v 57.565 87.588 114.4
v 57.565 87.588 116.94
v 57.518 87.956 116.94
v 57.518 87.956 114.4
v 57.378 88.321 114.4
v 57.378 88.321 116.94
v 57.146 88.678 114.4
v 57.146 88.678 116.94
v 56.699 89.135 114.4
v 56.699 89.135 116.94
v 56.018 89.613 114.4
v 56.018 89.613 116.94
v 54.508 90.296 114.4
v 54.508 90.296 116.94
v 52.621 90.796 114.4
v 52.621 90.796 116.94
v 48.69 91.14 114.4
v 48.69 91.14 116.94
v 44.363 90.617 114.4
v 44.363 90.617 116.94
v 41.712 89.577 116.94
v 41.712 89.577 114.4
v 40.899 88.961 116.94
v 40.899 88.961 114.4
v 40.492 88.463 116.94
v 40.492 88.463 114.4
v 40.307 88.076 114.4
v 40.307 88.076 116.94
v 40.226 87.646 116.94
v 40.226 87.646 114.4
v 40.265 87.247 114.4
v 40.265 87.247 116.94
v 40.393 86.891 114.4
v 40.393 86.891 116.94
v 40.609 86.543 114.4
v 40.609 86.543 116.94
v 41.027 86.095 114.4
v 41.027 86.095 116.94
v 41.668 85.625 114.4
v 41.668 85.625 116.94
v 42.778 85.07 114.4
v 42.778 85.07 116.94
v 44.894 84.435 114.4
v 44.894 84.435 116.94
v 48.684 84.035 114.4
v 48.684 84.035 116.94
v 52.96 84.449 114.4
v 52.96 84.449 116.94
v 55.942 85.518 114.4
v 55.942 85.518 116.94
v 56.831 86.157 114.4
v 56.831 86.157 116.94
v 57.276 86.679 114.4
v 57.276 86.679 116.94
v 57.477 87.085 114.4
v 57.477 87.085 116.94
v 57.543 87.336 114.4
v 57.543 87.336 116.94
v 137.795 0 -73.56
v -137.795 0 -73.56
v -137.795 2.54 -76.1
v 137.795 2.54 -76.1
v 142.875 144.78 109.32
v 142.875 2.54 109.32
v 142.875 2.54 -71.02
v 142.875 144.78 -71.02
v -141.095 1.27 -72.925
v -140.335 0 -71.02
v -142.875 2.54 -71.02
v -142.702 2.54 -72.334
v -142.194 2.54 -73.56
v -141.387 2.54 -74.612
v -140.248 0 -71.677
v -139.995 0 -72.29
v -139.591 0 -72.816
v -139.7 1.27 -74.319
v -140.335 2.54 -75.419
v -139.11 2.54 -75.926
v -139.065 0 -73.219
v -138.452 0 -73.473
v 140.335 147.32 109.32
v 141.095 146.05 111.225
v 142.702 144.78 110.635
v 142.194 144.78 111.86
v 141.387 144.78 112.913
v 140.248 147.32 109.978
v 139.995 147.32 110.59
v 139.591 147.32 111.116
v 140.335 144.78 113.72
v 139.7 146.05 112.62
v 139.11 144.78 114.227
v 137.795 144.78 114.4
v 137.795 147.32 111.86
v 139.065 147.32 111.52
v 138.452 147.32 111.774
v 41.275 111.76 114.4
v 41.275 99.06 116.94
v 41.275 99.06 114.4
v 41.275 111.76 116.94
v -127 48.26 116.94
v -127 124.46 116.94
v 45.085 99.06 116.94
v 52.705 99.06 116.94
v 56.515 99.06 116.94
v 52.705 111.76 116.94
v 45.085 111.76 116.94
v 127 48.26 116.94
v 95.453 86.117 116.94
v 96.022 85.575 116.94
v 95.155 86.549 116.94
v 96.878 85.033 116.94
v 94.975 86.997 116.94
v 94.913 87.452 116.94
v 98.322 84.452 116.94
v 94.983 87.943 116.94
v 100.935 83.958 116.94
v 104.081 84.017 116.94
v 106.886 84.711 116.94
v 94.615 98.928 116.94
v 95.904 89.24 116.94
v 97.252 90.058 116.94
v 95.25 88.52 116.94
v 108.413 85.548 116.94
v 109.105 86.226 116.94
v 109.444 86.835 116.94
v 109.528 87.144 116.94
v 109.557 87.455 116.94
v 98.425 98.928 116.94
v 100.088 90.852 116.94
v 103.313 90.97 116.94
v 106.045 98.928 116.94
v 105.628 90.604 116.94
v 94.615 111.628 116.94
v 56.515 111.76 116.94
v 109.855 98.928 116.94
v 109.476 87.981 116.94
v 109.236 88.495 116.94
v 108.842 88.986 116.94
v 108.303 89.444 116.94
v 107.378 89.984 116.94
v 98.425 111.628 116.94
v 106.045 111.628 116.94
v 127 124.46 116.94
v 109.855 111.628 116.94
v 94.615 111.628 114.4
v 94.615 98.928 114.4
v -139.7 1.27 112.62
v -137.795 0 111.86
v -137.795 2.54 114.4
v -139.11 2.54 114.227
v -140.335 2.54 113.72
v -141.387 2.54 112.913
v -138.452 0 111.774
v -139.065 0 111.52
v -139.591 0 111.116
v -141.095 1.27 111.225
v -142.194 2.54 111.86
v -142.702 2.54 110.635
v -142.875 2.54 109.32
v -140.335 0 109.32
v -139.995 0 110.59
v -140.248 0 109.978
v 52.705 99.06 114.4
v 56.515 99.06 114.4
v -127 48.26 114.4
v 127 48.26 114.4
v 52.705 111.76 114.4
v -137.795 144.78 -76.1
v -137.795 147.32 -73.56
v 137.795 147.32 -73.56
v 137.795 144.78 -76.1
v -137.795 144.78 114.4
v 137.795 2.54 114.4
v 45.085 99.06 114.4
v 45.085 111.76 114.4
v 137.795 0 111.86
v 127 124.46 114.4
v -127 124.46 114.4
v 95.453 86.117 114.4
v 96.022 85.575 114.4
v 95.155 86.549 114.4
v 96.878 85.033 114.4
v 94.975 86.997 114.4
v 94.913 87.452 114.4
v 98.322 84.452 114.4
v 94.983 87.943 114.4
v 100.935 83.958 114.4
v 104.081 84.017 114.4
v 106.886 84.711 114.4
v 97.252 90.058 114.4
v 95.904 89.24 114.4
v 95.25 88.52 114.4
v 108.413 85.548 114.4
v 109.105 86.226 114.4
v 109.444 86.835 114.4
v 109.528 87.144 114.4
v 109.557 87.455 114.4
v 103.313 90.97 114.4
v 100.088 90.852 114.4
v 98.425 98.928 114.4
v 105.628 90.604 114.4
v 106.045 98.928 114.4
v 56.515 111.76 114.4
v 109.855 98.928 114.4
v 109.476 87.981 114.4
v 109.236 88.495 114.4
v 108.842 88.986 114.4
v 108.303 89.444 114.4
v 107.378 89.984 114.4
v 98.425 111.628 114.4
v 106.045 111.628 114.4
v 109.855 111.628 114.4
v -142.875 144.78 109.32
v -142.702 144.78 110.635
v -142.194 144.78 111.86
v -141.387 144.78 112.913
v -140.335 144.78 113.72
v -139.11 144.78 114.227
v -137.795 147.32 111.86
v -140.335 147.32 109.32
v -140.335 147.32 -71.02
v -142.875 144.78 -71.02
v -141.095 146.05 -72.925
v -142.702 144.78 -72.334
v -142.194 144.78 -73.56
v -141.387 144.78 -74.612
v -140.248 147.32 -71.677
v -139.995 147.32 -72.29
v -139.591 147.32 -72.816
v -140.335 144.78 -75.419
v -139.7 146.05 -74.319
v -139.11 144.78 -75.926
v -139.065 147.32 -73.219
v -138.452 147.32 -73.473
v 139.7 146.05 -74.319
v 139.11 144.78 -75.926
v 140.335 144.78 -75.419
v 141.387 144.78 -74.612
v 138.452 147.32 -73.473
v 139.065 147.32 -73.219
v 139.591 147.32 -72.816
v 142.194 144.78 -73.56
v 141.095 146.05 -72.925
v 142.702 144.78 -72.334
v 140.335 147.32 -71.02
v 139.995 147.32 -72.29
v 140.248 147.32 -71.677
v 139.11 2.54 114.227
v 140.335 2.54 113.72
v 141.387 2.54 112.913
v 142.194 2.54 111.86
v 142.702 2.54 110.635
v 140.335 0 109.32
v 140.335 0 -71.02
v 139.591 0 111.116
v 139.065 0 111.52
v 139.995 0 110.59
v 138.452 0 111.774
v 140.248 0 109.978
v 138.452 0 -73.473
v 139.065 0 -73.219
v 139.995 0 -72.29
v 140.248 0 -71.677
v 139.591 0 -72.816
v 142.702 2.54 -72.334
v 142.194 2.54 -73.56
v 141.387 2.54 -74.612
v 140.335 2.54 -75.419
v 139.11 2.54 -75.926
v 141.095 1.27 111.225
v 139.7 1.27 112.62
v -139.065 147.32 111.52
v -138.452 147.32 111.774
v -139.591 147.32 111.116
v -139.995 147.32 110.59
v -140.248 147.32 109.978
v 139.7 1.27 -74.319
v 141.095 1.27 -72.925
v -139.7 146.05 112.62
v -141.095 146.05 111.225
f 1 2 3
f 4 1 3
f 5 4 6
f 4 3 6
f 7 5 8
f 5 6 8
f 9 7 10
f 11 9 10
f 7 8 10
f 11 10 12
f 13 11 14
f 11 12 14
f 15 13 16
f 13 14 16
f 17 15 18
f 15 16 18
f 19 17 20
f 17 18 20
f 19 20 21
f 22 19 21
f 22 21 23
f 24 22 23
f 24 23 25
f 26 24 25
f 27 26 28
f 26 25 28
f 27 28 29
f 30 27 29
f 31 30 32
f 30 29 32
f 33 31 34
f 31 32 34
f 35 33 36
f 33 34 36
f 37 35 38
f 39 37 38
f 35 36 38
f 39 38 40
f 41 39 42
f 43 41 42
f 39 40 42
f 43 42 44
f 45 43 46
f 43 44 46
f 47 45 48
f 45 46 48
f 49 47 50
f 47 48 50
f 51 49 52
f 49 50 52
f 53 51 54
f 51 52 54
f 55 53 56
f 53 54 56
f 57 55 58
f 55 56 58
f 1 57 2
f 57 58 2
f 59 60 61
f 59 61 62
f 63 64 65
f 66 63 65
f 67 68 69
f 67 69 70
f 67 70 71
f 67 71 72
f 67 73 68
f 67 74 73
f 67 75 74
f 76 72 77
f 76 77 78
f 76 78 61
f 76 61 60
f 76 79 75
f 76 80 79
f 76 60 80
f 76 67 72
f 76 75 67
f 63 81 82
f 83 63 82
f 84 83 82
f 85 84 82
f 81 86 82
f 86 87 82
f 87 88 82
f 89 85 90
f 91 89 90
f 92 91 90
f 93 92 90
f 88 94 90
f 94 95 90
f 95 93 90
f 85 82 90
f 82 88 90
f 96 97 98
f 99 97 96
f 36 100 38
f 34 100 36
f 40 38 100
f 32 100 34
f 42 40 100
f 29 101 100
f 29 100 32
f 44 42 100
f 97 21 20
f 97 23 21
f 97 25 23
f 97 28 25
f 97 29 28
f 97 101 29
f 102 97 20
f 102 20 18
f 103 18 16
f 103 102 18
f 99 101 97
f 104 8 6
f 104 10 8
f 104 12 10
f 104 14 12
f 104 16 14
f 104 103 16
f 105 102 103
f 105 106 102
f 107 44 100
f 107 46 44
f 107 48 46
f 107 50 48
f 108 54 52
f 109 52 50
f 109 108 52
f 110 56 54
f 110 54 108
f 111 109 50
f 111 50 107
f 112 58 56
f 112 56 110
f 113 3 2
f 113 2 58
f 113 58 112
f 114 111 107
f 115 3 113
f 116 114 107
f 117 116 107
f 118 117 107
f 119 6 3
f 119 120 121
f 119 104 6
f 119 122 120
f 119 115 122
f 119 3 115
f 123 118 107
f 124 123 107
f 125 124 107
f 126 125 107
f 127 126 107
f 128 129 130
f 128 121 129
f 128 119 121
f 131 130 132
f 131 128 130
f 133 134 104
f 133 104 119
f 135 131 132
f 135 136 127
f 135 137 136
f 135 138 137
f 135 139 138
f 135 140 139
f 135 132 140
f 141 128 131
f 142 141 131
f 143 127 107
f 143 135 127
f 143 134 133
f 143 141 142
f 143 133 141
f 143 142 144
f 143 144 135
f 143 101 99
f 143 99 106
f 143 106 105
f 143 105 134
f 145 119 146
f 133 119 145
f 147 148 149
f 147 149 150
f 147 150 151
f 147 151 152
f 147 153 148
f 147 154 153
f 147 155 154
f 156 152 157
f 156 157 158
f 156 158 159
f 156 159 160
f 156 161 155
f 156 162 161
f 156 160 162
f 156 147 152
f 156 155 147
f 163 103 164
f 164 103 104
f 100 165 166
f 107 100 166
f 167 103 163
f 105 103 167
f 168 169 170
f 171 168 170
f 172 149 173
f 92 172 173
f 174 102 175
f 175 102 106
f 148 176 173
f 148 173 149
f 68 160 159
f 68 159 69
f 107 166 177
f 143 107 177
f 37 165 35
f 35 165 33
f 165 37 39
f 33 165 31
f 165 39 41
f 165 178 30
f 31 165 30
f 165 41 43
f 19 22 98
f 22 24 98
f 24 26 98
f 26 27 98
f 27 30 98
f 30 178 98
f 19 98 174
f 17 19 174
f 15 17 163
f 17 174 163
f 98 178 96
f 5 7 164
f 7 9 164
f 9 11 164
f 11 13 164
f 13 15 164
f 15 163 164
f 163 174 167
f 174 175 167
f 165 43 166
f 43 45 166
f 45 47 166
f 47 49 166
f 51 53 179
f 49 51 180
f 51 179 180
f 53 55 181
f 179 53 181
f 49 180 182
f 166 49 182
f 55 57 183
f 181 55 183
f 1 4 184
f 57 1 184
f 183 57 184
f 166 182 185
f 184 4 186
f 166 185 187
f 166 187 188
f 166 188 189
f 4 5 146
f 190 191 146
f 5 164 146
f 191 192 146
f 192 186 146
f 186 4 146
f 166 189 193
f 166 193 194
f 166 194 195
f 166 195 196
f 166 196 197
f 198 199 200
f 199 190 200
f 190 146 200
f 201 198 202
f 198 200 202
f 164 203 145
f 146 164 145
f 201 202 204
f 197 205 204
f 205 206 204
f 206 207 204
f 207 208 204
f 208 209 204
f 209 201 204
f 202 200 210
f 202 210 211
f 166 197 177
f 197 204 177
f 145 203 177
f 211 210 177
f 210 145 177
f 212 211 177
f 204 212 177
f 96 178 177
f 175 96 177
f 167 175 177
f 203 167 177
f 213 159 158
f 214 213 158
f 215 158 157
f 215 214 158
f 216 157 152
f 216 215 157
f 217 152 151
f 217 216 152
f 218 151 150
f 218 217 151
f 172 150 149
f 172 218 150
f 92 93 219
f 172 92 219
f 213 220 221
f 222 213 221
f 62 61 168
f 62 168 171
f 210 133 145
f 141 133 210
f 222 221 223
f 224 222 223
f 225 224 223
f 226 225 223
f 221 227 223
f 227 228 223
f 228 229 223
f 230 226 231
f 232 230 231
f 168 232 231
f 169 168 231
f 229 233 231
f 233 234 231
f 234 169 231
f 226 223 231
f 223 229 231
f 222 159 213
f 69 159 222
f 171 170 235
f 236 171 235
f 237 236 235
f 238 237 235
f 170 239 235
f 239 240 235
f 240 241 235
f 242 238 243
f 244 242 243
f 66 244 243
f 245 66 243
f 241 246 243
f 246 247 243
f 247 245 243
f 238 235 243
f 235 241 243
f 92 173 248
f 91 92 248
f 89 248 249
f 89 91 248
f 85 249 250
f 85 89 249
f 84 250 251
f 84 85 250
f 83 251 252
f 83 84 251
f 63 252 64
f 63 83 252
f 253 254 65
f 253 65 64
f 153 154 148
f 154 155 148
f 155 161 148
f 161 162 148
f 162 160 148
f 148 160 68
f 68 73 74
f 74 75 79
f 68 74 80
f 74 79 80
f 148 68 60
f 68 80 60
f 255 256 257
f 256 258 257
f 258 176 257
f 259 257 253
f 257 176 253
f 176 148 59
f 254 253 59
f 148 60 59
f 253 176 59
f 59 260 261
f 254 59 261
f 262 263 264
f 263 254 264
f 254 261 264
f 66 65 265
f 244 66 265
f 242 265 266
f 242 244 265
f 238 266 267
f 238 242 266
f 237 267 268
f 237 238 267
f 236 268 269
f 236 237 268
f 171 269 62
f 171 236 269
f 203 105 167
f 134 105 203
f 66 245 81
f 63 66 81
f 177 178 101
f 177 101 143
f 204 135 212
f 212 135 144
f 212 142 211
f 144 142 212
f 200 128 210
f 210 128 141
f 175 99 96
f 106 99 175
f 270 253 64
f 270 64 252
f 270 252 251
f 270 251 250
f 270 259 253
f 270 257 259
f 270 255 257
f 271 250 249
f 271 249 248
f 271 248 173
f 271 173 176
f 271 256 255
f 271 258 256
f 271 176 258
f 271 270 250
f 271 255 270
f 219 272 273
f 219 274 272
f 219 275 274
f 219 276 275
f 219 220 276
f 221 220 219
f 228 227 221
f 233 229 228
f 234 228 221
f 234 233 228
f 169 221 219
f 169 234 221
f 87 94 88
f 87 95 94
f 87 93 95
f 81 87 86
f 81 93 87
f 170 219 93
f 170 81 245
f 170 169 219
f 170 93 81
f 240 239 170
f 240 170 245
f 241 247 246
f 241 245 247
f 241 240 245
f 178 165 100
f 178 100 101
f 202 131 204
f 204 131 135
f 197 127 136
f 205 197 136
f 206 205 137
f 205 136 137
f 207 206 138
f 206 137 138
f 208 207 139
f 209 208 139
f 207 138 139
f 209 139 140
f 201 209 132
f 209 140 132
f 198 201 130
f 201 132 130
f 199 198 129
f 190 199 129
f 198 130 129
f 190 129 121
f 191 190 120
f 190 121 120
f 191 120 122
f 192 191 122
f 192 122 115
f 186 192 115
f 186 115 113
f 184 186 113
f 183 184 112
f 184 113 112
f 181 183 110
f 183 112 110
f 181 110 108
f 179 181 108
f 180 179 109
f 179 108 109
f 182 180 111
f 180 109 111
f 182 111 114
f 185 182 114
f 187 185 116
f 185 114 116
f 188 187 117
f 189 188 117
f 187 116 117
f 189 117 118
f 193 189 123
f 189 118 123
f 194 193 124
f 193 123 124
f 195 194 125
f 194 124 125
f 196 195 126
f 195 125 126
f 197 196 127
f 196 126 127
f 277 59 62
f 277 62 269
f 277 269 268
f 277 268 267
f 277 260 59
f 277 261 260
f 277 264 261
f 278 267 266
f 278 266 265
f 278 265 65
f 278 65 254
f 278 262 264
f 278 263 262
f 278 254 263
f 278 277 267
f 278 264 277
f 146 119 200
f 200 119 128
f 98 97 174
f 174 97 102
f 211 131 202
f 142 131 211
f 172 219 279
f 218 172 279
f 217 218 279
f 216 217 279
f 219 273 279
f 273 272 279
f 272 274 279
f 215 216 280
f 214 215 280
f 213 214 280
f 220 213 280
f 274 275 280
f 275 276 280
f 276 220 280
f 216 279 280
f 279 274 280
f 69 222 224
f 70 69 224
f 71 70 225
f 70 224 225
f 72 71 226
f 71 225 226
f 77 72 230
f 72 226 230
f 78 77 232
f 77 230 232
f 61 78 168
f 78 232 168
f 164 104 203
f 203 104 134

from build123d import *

# Parameters (mm, degrees)
SKETCH1_W           = 285.75
SKETCH1_H           = 190.5
BOSS_EXTRUDE1_DEPTH = 147.32
SKETCH2_W           = 254
SKETCH2_H           = 76.2
BOSS_EXTRUDE2_DEPTH = 2.54
SKETCH3_W           = 3.81
SKETCH3_H           = 12.7
SKETCH3_RX          = 8.66973746
SKETCH3_RY          = 3.553284778
SKETCH3_RX_2        = 7.32155449
CUT_EXTRUDE1_DEPTH  = 2.54
FILLET1_R           = 5.08
CHAMFER1_SIZE       = 2.54


with BuildPart() as part:
    # Sketch1 → Boss-Extrude1 (new body)
    with BuildSketch(Plane(origin=(0, 0, 0), x_dir=(1, 0, 0), z_dir=(0, 1, 0))):
        with Locations((0, -19.150408048)):
            Rectangle(SKETCH1_W, SKETCH1_H)
    extrude(amount=BOSS_EXTRUDE1_DEPTH)

    # Fillet1
    fillet1_edges = [part.edges().sort_by_distance(p)[0] for p in [
        (142.875, 73.66, 114.400408048),
        (-142.875, 73.66, 114.400408048),
        (-142.875, 73.66, -76.099591952),
        (142.875, 73.66, -76.099591952),
    ]]
    fillet(fillet1_edges, radius=FILLET1_R)

    # Chamfer1
    chamfer1_edges = [part.edges().sort_by_distance(p)[0] for p in [
        (-142.875, 0, 19.150408048),
        (-142.875, 147.32, 19.150408048),
        (142.875, 0, 19.150408048),
        (0, 0, 114.400408048),
        (0, 0, -76.099591952),
        (141.387102448, 0, 112.912510497),
        (141.387102448, 0, -74.6116944),
        (-141.387102448, 0, 112.912510497),
        (-141.387102448, 0, -74.6116944),
        (0, 147.32, -76.099591952),
        (142.875, 147.32, 19.150408048),
        (0, 147.32, 114.400408048),
        (141.387102448, 147.32, 112.912510497),
        (141.387102448, 147.32, -74.6116944),
        (-141.387102448, 147.32, 112.912510497),
        (-141.387102448, 147.32, -74.6116944),
    ]]
    chamfer(chamfer1_edges, length=CHAMFER1_SIZE)


with BuildPart() as body_2:
    # Sketch2 → Boss-Extrude2 (new body)
    with BuildSketch(Plane.XY.offset(114.400408048)):
        with Locations((0, 86.36)):
            Rectangle(SKETCH2_W, SKETCH2_H)
    extrude(amount=BOSS_EXTRUDE2_DEPTH)

    # Sketch3 → Cut-Extrude1 (cut)
    with BuildSketch(Plane.XY.offset(116.940408048)):
        with Locations((43.18, 105.41)):
            Rectangle(SKETCH3_W, SKETCH3_H)
        with Locations((54.61, 105.41)):
            Rectangle(SKETCH3_W, SKETCH3_H)
        with Locations(Location((48.895, 87.587623133), (0, 0, 0))):
            Ellipse(SKETCH3_RX, SKETCH3_RY)
        with Locations((102.235, 87.455169614)):
            Ellipse(SKETCH3_RX_2, SKETCH3_RY)
        with Locations((96.52, 105.27754648)):
            Rectangle(SKETCH3_W, SKETCH3_H)
        with Locations((107.95, 105.27754648)):
            Rectangle(SKETCH3_W, SKETCH3_H)
    extrude(amount=-CUT_EXTRUDE1_DEPTH, mode=Mode.SUBTRACT)


solid = Compound([part.part, body_2.part])
